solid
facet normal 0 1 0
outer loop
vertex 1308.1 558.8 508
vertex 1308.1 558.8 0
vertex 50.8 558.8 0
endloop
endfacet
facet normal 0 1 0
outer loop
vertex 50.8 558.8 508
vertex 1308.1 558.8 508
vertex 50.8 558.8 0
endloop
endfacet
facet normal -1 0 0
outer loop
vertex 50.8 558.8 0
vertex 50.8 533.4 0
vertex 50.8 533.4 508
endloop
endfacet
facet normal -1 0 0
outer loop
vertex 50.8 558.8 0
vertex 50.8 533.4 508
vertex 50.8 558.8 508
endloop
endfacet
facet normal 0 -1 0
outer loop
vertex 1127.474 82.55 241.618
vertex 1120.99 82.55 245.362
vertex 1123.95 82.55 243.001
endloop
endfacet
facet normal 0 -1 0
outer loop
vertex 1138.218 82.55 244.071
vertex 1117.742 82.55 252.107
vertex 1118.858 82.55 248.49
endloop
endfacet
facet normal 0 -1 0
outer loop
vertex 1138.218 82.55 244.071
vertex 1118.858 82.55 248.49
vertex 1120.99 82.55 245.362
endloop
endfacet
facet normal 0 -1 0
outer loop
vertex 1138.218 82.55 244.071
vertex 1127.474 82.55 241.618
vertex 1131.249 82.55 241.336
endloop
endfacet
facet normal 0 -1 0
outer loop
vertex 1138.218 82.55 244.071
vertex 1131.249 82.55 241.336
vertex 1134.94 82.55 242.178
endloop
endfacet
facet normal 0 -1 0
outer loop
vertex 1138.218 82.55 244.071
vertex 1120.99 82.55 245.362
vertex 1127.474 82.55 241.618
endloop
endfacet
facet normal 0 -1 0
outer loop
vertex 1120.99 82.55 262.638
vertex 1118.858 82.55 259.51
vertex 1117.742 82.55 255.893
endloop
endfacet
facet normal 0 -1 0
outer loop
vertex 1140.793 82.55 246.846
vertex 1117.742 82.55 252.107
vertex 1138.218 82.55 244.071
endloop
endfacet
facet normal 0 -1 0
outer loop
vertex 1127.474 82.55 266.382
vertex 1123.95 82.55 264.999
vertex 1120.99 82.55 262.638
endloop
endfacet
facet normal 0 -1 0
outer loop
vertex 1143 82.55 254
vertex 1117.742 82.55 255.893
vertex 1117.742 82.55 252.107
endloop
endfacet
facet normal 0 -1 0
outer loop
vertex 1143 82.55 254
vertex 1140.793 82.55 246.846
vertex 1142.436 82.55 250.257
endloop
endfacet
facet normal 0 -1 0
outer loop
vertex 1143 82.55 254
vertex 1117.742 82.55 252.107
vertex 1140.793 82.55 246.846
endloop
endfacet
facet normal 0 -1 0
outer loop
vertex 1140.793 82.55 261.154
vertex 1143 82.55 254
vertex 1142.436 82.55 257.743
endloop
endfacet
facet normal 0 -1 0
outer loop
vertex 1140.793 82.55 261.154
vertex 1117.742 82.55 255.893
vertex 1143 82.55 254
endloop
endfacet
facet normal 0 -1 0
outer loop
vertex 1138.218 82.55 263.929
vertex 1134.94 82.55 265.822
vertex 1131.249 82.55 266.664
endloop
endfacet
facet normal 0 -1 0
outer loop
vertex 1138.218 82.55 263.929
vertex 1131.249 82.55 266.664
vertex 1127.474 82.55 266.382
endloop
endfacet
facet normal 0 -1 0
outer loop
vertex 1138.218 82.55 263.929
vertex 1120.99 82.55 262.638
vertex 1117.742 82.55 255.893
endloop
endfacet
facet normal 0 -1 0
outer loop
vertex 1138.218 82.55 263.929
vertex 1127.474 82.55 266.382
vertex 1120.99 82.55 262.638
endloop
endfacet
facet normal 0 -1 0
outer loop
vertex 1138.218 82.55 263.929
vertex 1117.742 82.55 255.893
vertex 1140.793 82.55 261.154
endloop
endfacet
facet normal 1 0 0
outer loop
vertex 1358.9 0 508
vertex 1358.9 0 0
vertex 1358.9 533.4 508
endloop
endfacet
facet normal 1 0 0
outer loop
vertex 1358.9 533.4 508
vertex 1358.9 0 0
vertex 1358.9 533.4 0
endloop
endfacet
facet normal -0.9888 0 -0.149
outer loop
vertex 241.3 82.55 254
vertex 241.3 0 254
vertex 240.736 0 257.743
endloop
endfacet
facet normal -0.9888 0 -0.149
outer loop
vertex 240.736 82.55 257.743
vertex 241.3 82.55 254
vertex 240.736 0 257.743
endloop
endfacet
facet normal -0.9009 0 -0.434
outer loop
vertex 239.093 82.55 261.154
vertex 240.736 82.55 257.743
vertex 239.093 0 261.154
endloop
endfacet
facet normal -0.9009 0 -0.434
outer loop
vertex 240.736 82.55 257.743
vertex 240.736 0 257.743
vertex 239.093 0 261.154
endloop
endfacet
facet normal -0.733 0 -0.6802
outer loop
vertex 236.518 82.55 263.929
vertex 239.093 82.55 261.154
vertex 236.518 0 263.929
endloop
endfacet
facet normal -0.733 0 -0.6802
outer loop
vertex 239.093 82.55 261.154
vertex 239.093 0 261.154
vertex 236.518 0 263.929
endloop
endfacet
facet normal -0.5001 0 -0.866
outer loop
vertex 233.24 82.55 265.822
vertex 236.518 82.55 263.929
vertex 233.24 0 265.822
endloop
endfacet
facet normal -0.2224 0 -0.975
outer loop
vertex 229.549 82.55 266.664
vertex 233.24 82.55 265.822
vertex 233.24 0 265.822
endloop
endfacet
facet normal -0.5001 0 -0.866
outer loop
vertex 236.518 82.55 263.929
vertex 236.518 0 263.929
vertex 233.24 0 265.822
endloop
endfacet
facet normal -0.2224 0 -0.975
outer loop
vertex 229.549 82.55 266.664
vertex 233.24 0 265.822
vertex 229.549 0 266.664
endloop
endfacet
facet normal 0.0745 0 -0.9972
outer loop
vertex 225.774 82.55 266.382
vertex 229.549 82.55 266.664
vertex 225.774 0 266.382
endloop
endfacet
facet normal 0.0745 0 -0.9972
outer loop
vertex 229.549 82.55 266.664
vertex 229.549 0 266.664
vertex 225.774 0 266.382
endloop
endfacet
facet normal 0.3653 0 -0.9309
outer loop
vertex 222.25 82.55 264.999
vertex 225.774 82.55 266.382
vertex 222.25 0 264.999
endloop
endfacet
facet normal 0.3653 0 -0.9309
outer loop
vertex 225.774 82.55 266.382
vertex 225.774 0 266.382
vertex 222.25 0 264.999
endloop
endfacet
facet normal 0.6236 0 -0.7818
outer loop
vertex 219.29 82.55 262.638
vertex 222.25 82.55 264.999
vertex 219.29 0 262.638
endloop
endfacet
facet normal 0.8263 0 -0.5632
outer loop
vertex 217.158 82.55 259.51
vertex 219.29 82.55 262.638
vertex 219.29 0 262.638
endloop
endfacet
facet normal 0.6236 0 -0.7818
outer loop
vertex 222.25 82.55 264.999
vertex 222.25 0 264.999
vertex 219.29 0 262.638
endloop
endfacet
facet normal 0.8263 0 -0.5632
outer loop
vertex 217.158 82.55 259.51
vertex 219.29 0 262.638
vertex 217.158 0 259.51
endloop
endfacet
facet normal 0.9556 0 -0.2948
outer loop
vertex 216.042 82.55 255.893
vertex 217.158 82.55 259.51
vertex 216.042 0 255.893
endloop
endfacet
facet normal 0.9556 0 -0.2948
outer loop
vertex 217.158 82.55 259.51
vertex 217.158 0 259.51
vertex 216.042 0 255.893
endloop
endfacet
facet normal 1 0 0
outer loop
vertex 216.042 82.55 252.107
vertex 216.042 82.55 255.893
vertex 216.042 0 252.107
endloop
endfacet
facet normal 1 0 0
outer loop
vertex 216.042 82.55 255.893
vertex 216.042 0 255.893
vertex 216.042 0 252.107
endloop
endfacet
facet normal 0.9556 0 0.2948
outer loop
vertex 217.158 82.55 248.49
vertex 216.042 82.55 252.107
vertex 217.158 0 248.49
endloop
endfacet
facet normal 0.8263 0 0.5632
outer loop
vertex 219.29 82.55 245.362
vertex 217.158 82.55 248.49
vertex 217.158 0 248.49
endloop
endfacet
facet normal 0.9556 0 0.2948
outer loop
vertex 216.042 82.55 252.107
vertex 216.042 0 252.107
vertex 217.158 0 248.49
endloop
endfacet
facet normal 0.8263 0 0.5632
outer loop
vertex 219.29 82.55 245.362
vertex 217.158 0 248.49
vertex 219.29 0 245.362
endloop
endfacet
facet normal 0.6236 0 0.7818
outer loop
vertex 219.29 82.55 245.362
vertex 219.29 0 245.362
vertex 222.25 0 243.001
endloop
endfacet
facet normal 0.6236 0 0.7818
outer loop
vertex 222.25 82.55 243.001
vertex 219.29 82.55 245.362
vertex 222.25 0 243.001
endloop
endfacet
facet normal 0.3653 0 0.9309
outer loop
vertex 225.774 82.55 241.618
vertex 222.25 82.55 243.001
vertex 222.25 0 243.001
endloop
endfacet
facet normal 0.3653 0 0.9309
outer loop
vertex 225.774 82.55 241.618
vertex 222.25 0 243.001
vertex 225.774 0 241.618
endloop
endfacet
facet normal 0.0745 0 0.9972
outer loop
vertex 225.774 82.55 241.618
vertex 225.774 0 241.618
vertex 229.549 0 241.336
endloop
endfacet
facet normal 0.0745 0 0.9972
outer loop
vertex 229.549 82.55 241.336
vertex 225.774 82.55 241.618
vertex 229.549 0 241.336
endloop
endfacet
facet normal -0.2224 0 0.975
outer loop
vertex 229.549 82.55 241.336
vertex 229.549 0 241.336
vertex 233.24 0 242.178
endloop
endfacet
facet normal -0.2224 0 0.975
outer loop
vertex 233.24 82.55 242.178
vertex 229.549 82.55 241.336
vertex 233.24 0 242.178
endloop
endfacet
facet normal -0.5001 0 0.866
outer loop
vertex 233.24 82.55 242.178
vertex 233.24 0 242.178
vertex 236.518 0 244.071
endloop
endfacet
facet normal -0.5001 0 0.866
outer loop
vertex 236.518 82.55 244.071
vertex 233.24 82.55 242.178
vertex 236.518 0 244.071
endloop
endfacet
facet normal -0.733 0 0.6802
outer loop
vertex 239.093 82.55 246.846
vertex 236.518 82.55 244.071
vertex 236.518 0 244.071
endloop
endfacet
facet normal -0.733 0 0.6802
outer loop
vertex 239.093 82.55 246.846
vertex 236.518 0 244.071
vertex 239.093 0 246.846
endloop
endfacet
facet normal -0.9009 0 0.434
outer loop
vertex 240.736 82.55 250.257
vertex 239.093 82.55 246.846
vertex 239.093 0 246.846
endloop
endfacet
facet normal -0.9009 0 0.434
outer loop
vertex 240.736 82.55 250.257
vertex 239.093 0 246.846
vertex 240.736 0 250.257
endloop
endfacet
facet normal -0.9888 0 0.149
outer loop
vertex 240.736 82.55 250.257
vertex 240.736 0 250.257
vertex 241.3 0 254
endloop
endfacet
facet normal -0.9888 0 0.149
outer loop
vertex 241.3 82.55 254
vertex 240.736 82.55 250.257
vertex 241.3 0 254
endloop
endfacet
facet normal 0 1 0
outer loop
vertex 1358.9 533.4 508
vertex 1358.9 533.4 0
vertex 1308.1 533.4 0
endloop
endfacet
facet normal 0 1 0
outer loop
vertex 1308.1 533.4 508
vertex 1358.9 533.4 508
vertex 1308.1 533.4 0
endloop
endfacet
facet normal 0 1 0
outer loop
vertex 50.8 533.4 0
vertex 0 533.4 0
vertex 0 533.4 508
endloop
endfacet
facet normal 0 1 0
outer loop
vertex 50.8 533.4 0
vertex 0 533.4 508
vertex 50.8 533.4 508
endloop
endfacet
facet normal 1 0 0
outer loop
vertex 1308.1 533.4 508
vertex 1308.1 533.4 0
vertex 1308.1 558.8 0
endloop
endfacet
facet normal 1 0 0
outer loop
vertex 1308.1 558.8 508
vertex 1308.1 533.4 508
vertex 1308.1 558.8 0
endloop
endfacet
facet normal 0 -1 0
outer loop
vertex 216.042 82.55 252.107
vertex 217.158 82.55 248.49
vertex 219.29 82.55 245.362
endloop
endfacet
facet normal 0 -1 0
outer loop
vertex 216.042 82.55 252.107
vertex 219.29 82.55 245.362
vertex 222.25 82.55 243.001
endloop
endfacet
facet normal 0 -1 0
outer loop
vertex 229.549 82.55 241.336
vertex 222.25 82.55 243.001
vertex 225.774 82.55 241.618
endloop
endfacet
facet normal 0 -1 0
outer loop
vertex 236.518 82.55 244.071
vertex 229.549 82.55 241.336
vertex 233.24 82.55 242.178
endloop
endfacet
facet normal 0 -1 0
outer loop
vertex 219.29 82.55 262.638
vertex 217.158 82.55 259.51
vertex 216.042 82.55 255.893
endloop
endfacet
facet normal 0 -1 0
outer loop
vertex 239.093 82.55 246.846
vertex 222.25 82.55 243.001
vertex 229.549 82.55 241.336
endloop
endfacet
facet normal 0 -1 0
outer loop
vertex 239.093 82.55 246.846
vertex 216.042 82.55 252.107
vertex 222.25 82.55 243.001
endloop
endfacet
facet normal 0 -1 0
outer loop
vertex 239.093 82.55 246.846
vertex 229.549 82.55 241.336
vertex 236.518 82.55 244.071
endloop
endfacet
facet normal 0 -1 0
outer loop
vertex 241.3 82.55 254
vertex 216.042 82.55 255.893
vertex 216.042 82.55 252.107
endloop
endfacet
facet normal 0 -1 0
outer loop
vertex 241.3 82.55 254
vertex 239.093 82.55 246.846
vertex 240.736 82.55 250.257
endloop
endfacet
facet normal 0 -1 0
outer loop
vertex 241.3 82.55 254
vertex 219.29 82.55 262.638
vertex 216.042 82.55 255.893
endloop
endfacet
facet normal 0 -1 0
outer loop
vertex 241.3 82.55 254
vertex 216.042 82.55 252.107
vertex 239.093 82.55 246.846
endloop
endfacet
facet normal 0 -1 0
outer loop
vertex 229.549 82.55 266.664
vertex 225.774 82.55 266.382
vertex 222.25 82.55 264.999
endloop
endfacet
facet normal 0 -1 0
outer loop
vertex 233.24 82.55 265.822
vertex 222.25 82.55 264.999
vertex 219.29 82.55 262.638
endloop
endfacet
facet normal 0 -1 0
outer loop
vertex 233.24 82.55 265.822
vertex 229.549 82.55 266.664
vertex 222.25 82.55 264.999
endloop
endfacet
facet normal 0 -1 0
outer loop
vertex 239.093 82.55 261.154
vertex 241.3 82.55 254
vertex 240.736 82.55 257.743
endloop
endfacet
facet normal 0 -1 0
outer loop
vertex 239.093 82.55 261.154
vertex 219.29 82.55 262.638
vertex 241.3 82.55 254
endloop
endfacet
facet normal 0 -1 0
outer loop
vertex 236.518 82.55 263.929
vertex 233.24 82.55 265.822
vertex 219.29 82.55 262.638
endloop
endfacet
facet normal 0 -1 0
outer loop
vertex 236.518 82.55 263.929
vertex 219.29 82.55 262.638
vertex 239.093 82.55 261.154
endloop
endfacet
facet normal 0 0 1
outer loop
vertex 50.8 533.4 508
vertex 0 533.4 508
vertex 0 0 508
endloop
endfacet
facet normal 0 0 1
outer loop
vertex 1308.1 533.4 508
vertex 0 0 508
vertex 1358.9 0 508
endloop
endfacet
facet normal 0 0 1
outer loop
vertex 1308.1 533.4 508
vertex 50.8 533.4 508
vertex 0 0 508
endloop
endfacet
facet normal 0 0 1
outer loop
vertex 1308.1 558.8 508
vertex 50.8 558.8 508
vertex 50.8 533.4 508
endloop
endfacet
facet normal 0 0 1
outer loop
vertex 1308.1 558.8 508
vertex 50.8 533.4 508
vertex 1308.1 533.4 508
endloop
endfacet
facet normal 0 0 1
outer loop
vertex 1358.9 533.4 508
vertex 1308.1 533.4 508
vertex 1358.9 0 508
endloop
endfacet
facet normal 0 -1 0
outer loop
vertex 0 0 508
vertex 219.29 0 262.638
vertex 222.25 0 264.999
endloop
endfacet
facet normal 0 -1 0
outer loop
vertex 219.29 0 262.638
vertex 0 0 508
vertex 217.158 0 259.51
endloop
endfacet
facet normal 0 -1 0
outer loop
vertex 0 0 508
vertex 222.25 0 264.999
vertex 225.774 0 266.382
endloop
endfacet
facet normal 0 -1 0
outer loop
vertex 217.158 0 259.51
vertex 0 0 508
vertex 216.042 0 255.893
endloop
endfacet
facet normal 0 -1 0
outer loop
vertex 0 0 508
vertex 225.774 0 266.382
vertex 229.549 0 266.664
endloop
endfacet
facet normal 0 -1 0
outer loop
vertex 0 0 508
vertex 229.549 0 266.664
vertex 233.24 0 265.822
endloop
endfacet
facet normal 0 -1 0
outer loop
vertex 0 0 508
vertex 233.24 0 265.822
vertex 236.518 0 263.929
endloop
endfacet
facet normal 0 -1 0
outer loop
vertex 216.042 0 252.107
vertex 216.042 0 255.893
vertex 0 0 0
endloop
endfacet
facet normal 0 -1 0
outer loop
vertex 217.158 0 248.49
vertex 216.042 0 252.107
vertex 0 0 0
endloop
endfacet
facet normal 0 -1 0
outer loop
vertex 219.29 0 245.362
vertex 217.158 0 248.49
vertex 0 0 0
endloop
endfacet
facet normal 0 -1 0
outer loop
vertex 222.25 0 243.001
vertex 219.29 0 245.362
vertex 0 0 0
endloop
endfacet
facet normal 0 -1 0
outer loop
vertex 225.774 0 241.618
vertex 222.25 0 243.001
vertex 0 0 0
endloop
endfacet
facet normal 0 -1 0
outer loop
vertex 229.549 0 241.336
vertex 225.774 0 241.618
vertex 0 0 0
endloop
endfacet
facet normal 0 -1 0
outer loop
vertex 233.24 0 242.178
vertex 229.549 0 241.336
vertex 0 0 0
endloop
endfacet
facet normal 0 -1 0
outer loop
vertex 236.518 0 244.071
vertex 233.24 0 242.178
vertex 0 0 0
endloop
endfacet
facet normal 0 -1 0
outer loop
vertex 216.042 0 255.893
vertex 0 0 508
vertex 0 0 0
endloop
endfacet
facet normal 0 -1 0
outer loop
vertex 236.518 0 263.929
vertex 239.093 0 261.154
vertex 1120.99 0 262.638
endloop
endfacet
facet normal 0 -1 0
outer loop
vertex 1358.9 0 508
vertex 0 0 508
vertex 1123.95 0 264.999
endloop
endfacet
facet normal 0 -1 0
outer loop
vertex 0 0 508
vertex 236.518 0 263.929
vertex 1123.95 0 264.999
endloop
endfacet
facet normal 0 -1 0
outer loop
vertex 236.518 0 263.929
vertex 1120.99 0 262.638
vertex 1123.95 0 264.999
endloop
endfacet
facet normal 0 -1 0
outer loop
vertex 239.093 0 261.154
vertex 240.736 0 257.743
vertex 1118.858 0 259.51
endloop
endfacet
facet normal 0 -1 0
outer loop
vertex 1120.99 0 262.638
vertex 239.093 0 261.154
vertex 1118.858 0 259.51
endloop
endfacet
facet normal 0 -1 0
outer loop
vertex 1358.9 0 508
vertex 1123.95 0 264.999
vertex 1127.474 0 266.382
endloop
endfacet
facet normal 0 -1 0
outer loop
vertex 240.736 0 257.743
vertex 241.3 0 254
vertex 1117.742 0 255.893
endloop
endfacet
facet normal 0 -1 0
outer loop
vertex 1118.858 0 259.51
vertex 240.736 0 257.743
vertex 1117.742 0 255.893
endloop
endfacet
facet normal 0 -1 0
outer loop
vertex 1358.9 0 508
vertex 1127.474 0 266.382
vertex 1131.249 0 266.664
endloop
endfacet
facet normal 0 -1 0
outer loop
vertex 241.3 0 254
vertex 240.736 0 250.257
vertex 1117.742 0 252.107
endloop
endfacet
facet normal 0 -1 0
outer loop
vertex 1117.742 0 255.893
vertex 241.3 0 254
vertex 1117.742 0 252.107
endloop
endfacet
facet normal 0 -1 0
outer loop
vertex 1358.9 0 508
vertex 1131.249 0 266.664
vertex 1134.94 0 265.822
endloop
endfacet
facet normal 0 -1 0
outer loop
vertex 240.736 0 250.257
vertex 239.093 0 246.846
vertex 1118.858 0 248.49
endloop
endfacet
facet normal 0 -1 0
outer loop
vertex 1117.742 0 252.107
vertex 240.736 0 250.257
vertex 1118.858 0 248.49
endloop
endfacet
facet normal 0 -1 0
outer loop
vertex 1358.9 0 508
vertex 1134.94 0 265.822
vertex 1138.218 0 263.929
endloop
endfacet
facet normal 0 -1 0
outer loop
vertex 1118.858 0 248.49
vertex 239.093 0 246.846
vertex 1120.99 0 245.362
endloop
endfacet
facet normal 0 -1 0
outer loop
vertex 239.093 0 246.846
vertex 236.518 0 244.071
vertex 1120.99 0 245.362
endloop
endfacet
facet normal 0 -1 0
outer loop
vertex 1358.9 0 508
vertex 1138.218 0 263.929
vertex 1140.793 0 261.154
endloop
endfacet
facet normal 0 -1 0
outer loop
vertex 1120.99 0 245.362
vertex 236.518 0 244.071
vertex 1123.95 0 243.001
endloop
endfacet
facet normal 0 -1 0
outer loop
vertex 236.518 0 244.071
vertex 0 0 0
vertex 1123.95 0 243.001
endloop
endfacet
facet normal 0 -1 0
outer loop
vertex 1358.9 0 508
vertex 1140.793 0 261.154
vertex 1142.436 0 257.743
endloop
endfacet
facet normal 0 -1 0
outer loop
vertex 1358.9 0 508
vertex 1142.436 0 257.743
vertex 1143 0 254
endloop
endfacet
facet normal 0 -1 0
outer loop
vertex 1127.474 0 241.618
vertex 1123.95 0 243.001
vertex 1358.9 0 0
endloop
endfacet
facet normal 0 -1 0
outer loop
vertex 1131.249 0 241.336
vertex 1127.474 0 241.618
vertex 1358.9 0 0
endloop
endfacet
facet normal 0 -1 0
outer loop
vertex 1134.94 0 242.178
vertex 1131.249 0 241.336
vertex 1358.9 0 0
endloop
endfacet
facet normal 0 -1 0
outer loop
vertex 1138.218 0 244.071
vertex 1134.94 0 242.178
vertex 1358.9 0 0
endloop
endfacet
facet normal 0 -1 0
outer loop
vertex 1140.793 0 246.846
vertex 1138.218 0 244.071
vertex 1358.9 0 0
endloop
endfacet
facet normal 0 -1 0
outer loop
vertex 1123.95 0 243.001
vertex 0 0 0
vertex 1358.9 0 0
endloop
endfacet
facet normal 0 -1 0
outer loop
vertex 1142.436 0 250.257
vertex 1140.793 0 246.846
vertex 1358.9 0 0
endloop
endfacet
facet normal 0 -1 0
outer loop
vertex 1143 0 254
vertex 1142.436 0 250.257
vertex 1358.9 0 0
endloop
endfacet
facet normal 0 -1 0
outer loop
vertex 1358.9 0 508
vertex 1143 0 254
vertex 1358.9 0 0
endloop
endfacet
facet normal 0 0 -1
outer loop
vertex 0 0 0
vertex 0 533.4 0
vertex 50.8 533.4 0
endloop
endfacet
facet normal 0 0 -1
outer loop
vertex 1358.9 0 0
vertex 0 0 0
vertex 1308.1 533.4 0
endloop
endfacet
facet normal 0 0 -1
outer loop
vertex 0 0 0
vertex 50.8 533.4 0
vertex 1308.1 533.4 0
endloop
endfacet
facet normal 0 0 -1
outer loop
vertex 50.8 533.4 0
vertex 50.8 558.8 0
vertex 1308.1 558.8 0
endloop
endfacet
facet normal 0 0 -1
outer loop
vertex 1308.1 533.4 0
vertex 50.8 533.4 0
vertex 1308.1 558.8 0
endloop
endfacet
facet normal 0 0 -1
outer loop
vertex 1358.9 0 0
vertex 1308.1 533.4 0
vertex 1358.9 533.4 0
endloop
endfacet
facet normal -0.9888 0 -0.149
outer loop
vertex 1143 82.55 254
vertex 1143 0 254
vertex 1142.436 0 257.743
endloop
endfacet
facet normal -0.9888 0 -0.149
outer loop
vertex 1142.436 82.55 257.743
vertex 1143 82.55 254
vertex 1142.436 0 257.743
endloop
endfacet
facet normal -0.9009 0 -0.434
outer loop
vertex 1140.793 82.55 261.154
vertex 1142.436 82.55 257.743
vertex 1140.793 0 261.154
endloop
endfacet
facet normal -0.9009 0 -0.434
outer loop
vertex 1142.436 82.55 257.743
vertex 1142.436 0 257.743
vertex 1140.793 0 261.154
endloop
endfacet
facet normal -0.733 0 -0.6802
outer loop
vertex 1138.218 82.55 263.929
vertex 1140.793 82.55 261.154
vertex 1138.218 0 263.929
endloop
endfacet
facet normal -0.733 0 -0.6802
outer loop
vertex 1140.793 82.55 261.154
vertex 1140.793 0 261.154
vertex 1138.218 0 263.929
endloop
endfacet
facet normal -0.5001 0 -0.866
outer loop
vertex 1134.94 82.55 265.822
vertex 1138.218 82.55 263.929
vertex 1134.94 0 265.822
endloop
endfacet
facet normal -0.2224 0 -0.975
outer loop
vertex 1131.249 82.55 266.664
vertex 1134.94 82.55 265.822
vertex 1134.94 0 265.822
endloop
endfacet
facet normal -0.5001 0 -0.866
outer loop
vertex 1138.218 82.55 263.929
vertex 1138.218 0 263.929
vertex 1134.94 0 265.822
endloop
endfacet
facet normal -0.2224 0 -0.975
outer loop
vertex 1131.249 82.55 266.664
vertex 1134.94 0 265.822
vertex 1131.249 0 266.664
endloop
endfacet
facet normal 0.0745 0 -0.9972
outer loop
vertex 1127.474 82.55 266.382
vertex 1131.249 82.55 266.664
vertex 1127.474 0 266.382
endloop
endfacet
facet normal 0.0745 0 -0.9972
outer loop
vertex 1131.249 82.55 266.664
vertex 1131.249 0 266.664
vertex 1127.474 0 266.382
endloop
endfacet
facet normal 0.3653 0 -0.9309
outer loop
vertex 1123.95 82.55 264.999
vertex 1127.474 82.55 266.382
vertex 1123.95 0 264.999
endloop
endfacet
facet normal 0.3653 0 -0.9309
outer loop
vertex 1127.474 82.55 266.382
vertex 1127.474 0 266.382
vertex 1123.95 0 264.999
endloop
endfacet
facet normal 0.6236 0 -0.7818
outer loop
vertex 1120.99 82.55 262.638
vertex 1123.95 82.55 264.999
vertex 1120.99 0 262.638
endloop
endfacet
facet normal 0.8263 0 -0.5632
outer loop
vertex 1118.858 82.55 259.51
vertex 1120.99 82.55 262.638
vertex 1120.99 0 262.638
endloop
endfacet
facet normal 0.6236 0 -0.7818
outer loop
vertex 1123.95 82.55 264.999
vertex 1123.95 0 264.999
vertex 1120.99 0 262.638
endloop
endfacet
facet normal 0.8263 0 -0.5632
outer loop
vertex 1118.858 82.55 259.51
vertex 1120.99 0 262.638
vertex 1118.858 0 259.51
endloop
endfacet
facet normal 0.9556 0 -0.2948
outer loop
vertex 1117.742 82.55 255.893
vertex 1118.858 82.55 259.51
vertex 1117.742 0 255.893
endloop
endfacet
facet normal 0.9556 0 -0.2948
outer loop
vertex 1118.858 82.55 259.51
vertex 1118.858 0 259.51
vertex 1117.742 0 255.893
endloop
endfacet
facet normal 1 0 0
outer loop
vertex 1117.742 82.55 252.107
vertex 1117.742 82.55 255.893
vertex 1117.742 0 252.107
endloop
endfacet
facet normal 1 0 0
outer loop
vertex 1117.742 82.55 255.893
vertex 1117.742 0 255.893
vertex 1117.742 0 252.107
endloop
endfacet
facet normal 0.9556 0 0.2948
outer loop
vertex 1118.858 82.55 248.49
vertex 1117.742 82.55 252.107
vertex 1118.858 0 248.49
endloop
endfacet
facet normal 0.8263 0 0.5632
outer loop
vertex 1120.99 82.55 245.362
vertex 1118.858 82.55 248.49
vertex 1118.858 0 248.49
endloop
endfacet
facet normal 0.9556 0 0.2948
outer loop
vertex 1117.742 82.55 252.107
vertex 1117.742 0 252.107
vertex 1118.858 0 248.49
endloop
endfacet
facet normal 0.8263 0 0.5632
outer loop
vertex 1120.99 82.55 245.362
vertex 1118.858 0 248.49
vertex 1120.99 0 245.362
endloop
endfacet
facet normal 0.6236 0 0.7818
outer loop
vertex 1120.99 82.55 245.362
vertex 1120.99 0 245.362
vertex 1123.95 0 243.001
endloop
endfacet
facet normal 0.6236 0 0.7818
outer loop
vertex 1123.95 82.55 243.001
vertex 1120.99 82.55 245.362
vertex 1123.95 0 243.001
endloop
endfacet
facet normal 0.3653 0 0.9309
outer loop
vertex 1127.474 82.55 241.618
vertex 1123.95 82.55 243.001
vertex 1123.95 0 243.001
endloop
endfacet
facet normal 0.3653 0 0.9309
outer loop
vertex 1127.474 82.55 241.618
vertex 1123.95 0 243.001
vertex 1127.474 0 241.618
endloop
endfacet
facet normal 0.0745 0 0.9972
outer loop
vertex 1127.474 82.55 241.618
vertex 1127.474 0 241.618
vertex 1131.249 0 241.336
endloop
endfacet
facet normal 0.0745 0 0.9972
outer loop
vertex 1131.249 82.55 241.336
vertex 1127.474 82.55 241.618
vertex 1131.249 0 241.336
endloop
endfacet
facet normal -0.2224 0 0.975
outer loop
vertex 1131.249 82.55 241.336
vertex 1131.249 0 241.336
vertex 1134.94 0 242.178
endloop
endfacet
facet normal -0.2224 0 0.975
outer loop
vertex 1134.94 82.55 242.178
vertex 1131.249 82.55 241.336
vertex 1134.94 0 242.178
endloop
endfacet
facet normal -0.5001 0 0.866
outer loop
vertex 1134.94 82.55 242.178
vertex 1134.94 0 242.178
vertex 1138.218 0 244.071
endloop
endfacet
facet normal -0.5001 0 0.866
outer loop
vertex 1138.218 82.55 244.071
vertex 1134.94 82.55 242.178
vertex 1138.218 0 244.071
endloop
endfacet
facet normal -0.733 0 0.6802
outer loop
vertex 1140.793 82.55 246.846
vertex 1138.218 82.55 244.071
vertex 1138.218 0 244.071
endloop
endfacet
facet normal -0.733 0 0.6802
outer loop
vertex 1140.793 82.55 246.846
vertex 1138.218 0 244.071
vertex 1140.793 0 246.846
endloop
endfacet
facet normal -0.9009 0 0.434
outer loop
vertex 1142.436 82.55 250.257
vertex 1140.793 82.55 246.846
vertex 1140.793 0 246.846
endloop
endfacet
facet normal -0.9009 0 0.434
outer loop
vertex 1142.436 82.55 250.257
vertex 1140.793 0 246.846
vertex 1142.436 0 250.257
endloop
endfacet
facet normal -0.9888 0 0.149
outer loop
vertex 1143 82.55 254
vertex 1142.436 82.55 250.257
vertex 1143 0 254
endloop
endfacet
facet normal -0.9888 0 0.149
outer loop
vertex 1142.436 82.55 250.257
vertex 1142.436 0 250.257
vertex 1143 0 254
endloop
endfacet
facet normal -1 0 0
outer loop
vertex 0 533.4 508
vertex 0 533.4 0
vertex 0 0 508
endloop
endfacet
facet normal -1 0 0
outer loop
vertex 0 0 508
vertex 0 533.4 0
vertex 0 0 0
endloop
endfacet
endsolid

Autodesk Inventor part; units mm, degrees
ref_plane "YZ Plane" through (0, 0, 0) normal (1, 0, 0) x (0, 1, 0)
ref_plane "XZ Plane" through (0, 0, 0) normal (0, 1, 0) x (-1, 0, 0)
ref_plane "XY Plane" through (0, 0, 0) normal (0, 0, 1) x (1, 0, 0)
sketch "Sketch1" plane through (0, 0, 0) normal (0, 0, 1) x (1, 0, 0)
  line L0 (0, 0) -> (1358.9, 0)
  line L1 (1358.9, 0) -> (1358.9, 533.4)
  line L2 (1358.9, 558.8) -> (1308.1, 558.8) construction
  line L3 (0, 558.8) -> (0, 533.4) construction
  line L4 (0, 533.4) -> (50.8, 533.4)
  line L5 (50.8, 533.4) -> (50.8, 558.8)
  line L6 (50.8, 558.8) -> (0, 558.8) construction
  line L7 (0, 533.4) -> (0, 0)
  line L8 (1358.9, 533.4) -> (1308.1, 533.4)
  line L9 (1308.1, 533.4) -> (1308.1, 558.8)
  line L10 (1308.1, 558.8) -> (50.8, 558.8)
  line L11 (1358.9, 533.4) -> (1358.9, 558.8) construction
  dimension "d0" = 1358.9
  dimension "d1" = 558.8
  dimension "d2" = 25.4
  dimension "d3" = 50.8
  dimension "d4" = 25.4
  dimension "d5" = 50.8
extrude "Extrusion1" add sketch "Sketch1" along normal blind 508
sketch "Sketch2" plane through (0, 0, 0) normal (0, -1, 0) x (1, 0, 0)
  line L0 (0, 0) -> (0, 508) projected
  line L1 (0, 254) -> (1358.9, 254) construction
  line L2 (1358.9, 0) -> (1358.9, 508) construction
  circle A0 centre (228.6, 254) radius 12.7
  circle A1 centre (1130.3, 254) radius 12.7
  dimension "d8" = 25.4
  dimension "d9" = 25.4
  dimension "d10" = 228.6
  dimension "d11" = 228.6
extrude "Extrusion2" cut sketch "Sketch2" against normal blind 82.55
equation "\"d11\" = d10"
properties part number "Seat block B" material "Granite, Cut, Polished"
